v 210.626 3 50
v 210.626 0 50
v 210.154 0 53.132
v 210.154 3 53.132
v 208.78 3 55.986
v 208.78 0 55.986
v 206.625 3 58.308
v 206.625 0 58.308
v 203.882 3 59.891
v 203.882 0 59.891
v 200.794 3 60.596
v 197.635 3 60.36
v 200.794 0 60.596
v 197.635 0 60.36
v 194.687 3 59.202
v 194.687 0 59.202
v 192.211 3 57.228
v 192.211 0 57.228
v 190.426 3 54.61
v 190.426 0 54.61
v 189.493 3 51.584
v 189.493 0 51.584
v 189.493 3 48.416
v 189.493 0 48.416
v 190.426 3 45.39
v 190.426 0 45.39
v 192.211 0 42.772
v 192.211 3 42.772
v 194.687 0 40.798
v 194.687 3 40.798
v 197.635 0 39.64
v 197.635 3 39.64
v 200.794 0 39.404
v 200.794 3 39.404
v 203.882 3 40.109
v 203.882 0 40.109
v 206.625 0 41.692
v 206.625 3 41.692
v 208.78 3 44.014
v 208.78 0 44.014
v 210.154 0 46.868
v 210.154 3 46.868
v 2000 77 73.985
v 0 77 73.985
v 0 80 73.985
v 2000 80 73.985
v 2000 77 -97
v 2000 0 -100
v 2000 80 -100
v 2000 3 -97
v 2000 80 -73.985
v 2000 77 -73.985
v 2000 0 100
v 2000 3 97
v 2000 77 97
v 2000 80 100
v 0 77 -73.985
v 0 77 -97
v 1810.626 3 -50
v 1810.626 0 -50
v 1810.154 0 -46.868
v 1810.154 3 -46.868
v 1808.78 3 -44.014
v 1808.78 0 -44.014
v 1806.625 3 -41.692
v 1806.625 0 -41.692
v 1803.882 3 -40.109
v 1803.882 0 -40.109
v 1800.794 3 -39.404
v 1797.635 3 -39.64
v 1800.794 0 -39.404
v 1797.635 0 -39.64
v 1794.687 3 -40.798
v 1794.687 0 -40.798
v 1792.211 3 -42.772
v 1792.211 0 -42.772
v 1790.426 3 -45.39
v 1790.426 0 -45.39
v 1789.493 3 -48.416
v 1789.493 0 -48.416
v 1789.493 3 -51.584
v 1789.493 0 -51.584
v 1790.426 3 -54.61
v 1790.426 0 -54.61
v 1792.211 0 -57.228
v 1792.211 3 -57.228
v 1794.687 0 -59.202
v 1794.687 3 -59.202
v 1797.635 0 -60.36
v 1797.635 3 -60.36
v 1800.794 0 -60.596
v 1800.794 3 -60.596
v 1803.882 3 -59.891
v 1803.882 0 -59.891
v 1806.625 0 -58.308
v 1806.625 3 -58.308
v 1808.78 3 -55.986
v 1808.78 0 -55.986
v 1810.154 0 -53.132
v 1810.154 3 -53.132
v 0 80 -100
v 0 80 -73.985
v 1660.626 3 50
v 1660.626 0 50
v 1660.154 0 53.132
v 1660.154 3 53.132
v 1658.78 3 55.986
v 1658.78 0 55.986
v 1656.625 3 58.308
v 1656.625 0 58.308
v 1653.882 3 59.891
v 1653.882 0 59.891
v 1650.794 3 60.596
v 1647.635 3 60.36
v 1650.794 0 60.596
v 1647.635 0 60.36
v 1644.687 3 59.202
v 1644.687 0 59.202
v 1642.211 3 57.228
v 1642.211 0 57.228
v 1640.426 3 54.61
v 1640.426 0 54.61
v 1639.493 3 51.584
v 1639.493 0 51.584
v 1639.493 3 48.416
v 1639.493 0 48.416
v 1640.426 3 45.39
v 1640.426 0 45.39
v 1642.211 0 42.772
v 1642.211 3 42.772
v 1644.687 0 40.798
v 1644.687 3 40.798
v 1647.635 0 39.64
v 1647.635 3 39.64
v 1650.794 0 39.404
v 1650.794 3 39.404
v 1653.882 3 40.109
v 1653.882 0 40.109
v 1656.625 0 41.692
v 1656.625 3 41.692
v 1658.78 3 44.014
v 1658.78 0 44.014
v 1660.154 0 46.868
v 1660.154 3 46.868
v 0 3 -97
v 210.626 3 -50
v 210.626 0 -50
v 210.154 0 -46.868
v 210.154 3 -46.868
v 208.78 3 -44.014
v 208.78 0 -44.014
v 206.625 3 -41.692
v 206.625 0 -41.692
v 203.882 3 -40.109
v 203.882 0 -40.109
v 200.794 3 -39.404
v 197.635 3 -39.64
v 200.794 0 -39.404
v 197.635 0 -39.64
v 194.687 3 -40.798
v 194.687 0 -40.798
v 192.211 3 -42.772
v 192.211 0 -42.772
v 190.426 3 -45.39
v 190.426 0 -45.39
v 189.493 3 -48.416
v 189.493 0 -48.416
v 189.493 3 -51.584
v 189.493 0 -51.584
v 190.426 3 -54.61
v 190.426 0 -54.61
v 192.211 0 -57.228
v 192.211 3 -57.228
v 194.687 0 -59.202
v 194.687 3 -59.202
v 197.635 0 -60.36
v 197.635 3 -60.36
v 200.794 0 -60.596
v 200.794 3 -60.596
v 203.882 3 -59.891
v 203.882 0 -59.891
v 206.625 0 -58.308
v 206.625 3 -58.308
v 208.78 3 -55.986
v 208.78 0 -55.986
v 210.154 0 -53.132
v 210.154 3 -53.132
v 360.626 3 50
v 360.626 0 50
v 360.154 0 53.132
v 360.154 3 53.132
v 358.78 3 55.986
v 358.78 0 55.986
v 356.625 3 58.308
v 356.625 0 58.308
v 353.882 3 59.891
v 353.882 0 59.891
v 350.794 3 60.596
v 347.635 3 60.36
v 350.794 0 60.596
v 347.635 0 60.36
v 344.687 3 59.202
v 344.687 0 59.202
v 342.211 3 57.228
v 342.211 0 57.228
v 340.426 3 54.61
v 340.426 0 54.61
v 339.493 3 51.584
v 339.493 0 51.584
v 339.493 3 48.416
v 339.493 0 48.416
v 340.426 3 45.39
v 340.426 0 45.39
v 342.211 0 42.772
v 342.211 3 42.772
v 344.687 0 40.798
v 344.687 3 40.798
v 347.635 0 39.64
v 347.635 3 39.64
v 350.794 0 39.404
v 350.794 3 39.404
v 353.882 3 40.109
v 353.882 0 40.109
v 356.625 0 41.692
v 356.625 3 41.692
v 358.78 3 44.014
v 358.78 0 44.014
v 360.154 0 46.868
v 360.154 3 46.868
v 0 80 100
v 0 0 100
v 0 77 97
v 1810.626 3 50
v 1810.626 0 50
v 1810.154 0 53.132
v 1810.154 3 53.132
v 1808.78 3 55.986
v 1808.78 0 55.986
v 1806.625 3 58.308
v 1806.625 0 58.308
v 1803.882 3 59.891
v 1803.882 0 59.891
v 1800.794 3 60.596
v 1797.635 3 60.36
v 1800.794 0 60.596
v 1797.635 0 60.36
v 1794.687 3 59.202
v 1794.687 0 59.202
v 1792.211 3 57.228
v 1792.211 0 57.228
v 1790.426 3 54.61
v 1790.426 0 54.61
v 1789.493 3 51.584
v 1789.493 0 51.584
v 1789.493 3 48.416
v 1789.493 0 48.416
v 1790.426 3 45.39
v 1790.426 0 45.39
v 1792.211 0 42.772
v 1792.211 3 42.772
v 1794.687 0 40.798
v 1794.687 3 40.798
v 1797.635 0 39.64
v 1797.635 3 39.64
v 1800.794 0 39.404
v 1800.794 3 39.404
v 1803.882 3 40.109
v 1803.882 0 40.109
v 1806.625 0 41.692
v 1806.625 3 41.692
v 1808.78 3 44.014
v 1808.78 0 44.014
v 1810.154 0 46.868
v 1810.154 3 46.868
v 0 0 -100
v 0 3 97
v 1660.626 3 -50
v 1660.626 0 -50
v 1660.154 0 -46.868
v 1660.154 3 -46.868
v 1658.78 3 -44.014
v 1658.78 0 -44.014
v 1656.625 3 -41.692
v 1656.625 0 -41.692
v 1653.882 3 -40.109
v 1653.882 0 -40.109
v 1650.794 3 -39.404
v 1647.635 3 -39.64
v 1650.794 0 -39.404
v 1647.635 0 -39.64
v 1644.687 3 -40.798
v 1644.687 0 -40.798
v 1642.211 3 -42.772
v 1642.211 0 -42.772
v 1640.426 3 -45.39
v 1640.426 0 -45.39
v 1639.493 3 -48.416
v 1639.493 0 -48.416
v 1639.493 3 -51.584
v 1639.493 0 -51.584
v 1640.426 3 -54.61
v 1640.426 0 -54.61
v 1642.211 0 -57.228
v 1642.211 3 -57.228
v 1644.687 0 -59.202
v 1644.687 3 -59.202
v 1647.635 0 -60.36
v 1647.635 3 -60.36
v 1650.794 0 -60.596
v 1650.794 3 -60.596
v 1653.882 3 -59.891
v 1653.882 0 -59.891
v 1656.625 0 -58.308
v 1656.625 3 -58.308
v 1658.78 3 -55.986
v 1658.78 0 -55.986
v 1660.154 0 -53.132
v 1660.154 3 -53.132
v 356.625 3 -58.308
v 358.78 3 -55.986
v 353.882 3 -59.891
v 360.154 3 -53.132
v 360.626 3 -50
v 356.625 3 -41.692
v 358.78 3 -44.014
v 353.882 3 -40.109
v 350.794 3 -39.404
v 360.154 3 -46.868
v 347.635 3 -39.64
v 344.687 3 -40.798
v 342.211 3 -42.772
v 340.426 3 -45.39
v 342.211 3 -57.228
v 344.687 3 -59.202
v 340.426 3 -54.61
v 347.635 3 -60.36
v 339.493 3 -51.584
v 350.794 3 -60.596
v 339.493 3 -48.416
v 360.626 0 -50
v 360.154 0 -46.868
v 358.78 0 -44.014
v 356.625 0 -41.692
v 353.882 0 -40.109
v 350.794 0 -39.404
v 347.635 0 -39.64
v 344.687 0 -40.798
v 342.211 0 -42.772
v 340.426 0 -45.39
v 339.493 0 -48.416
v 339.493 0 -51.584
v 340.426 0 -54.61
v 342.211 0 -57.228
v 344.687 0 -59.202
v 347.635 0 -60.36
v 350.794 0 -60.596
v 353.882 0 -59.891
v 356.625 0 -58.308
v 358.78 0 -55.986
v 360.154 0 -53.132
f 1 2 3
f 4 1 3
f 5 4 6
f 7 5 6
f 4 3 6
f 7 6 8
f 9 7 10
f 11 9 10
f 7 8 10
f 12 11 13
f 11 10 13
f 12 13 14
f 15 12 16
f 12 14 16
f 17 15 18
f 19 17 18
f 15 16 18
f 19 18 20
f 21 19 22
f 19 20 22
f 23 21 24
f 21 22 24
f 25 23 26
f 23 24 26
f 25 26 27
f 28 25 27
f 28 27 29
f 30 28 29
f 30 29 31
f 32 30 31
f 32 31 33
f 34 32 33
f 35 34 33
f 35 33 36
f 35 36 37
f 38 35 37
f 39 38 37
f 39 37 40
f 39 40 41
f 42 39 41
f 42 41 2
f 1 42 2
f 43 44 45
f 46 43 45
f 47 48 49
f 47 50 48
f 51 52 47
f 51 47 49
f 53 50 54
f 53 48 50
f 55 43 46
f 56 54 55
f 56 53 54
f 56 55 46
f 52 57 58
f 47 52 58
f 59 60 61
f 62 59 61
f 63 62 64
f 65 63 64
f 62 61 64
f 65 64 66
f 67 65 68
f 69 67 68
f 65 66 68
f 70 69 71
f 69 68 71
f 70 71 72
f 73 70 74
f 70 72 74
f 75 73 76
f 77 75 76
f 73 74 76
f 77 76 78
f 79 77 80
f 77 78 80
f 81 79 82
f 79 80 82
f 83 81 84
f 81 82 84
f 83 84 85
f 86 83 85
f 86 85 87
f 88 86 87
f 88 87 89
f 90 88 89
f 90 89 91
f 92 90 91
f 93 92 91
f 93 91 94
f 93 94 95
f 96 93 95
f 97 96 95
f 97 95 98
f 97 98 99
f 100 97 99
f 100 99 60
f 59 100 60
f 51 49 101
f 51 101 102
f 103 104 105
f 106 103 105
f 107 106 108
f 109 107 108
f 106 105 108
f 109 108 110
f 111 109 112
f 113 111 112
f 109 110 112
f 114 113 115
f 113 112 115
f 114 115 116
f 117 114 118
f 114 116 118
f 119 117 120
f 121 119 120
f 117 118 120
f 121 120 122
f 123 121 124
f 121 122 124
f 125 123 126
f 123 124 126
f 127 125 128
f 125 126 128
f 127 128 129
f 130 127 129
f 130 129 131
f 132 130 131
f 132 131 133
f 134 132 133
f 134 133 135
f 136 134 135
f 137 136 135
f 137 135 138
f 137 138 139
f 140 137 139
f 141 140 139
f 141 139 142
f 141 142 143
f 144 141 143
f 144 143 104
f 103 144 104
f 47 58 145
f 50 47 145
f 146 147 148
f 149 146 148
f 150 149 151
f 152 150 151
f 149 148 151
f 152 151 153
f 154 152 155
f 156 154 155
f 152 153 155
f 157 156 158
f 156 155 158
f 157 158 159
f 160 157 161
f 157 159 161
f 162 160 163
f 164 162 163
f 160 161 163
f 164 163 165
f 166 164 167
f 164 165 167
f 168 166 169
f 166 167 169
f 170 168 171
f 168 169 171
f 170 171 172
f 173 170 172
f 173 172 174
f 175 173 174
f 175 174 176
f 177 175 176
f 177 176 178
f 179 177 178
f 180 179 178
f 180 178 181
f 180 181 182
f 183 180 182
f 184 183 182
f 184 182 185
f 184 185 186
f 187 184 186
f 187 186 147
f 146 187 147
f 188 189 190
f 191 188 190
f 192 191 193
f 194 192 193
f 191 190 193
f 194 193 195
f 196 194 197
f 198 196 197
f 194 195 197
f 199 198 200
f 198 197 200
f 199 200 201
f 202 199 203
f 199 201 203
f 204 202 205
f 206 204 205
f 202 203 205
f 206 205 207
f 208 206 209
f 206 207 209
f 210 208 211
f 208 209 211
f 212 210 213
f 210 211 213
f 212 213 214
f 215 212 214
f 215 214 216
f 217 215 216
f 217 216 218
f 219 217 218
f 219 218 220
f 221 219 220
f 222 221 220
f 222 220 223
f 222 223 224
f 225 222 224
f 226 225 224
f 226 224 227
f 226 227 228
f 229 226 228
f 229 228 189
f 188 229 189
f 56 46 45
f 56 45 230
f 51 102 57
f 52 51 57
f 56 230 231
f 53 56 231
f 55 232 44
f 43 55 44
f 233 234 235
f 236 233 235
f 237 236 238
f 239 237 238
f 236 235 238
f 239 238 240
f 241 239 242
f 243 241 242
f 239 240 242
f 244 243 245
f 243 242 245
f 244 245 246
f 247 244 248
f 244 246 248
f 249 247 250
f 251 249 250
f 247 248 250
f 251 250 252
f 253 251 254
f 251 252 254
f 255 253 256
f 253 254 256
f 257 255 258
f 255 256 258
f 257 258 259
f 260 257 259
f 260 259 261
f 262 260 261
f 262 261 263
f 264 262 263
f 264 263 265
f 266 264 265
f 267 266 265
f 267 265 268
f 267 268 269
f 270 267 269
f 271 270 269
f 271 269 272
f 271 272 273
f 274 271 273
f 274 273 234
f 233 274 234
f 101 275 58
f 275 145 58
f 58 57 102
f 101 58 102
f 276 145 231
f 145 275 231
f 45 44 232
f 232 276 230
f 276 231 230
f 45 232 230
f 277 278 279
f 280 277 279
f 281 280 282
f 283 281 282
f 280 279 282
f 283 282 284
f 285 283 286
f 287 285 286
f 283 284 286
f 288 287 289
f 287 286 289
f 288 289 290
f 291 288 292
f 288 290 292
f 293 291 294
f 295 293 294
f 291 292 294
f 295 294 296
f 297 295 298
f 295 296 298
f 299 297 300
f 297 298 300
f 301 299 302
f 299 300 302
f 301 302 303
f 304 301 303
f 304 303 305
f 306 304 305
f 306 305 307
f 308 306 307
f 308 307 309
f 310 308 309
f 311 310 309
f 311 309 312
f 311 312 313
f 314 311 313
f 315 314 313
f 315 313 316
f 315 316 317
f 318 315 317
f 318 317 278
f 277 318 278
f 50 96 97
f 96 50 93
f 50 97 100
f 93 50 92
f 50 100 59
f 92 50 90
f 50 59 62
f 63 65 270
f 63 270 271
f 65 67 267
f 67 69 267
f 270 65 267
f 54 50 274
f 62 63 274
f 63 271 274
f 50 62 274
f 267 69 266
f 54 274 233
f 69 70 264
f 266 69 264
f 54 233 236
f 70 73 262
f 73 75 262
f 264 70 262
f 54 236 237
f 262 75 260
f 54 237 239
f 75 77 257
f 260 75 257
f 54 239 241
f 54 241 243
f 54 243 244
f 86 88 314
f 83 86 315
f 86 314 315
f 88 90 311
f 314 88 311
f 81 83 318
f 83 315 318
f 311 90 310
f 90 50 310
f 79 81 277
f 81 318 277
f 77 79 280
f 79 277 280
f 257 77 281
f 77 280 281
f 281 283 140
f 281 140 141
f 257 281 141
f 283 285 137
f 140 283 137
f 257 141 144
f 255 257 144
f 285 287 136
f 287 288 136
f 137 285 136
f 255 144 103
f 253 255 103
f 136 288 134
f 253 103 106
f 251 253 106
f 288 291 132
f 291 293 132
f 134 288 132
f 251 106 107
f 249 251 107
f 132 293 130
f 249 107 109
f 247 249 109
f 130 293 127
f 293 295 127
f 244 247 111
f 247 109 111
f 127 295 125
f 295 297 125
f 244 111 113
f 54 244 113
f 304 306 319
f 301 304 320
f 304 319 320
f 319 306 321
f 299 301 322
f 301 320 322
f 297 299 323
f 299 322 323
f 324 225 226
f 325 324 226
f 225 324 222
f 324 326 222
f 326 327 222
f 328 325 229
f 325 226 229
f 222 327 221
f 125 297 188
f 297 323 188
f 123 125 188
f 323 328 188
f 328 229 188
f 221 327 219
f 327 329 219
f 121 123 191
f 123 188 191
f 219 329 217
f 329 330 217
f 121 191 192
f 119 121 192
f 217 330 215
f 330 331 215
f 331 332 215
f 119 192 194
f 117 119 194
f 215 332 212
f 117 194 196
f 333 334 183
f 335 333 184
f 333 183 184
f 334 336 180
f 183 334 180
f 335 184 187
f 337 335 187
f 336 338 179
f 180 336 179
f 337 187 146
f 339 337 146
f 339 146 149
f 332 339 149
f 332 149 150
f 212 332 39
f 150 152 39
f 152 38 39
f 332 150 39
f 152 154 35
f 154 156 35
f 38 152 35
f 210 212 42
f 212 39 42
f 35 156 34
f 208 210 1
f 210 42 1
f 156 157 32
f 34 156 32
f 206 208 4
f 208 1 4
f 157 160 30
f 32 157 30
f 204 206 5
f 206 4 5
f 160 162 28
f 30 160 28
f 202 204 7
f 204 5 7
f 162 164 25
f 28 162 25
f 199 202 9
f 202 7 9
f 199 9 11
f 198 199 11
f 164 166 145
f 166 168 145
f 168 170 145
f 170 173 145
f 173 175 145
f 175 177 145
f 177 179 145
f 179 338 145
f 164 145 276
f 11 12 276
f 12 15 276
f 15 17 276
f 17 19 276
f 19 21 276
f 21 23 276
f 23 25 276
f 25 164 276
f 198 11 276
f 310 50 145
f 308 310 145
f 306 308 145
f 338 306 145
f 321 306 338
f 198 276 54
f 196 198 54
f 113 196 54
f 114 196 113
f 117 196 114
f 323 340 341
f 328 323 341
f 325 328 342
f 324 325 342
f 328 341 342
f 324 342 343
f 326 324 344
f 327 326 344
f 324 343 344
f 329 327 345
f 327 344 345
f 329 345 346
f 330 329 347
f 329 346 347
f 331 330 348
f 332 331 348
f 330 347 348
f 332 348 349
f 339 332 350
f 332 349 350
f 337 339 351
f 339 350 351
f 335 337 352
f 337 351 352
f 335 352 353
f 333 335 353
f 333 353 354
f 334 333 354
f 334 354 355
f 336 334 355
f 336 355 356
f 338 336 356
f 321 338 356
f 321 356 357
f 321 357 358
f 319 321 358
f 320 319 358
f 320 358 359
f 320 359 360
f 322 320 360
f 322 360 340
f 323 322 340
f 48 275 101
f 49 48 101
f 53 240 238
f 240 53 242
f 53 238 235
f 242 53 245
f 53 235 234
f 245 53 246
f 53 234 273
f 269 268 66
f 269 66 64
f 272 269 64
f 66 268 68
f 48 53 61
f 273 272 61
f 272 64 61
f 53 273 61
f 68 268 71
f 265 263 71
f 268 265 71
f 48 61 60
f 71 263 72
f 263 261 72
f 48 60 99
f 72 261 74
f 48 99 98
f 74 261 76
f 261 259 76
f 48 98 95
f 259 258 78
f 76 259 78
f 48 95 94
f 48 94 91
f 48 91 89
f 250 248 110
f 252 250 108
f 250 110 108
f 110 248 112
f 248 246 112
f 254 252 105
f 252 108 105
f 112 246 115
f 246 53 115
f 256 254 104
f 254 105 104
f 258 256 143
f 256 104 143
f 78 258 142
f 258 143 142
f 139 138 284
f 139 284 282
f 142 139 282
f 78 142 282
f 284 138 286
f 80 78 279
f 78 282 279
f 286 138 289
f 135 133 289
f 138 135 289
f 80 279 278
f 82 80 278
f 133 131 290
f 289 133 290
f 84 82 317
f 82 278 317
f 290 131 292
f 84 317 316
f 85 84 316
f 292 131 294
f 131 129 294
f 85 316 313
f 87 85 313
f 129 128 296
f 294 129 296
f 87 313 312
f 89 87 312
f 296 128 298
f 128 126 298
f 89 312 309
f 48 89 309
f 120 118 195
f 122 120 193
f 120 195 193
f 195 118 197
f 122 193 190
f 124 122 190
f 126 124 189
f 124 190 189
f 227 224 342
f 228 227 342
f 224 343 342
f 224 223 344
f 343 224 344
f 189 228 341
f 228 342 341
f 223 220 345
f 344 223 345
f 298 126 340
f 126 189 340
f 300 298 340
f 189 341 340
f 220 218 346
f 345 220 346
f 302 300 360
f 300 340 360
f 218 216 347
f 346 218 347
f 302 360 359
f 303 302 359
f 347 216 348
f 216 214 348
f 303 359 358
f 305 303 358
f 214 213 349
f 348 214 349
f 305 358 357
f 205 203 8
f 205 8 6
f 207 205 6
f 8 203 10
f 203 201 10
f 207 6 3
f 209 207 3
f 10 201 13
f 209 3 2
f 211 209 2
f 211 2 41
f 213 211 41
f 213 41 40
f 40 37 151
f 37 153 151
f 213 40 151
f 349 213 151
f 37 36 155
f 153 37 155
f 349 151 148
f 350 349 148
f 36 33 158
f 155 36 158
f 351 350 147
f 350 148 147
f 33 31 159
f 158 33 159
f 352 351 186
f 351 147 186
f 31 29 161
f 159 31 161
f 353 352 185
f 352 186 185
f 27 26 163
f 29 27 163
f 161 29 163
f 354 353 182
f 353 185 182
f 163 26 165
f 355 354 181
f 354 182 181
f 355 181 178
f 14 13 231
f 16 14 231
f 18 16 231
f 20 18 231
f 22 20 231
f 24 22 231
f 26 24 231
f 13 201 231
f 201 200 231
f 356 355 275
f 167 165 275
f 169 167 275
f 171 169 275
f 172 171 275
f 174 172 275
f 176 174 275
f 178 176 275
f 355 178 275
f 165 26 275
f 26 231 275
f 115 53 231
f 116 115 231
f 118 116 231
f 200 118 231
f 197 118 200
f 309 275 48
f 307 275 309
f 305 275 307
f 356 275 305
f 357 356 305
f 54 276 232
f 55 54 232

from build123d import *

# Parameters (mm, degrees)
F1_DEPTH = 2000
F2_R     = 10.626001
F3_DEPTH = 25
F4_R     = 10.626001
F5_DEPTH = 25


with BuildPart() as f1:
    # F0 (on Right) → F1 (new body)
    with BuildSketch(Plane.YZ):
        Polygon((0, 100), (0, 0), (0, -100), (80, -100), (80, -73.984891), (77, -73.984891), (77, -97), (3, -97), (3, 0), (3, 97), (77, 97), (77, 73.984891), (80, 73.984891), (80, 100), align=None)
    extrude(amount=F1_DEPTH)

    # F2 (on face) → F3 (cut)
    with BuildSketch(Plane.XZ):
        with Locations((200, 50)):
            Circle(F2_R)
        with Locations((200, -50)):
            Circle(F2_R)
        with Locations((350, 50)):
            Circle(F2_R)
        with Locations((350, -50)):
            Circle(F2_R)
    extrude(amount=-F3_DEPTH, mode=Mode.SUBTRACT)

    # F4 (on face) → F5 (cut)
    with BuildSketch(Plane.XZ):
        with Locations((1650, 50)):
            Circle(F4_R)
        with Locations((1650, -50)):
            Circle(F4_R)
        with Locations((1800, 50)):
            Circle(F4_R)
        with Locations((1800, -50)):
            Circle(F4_R)
    extrude(amount=-F5_DEPTH, mode=Mode.SUBTRACT)


solid = f1.part
